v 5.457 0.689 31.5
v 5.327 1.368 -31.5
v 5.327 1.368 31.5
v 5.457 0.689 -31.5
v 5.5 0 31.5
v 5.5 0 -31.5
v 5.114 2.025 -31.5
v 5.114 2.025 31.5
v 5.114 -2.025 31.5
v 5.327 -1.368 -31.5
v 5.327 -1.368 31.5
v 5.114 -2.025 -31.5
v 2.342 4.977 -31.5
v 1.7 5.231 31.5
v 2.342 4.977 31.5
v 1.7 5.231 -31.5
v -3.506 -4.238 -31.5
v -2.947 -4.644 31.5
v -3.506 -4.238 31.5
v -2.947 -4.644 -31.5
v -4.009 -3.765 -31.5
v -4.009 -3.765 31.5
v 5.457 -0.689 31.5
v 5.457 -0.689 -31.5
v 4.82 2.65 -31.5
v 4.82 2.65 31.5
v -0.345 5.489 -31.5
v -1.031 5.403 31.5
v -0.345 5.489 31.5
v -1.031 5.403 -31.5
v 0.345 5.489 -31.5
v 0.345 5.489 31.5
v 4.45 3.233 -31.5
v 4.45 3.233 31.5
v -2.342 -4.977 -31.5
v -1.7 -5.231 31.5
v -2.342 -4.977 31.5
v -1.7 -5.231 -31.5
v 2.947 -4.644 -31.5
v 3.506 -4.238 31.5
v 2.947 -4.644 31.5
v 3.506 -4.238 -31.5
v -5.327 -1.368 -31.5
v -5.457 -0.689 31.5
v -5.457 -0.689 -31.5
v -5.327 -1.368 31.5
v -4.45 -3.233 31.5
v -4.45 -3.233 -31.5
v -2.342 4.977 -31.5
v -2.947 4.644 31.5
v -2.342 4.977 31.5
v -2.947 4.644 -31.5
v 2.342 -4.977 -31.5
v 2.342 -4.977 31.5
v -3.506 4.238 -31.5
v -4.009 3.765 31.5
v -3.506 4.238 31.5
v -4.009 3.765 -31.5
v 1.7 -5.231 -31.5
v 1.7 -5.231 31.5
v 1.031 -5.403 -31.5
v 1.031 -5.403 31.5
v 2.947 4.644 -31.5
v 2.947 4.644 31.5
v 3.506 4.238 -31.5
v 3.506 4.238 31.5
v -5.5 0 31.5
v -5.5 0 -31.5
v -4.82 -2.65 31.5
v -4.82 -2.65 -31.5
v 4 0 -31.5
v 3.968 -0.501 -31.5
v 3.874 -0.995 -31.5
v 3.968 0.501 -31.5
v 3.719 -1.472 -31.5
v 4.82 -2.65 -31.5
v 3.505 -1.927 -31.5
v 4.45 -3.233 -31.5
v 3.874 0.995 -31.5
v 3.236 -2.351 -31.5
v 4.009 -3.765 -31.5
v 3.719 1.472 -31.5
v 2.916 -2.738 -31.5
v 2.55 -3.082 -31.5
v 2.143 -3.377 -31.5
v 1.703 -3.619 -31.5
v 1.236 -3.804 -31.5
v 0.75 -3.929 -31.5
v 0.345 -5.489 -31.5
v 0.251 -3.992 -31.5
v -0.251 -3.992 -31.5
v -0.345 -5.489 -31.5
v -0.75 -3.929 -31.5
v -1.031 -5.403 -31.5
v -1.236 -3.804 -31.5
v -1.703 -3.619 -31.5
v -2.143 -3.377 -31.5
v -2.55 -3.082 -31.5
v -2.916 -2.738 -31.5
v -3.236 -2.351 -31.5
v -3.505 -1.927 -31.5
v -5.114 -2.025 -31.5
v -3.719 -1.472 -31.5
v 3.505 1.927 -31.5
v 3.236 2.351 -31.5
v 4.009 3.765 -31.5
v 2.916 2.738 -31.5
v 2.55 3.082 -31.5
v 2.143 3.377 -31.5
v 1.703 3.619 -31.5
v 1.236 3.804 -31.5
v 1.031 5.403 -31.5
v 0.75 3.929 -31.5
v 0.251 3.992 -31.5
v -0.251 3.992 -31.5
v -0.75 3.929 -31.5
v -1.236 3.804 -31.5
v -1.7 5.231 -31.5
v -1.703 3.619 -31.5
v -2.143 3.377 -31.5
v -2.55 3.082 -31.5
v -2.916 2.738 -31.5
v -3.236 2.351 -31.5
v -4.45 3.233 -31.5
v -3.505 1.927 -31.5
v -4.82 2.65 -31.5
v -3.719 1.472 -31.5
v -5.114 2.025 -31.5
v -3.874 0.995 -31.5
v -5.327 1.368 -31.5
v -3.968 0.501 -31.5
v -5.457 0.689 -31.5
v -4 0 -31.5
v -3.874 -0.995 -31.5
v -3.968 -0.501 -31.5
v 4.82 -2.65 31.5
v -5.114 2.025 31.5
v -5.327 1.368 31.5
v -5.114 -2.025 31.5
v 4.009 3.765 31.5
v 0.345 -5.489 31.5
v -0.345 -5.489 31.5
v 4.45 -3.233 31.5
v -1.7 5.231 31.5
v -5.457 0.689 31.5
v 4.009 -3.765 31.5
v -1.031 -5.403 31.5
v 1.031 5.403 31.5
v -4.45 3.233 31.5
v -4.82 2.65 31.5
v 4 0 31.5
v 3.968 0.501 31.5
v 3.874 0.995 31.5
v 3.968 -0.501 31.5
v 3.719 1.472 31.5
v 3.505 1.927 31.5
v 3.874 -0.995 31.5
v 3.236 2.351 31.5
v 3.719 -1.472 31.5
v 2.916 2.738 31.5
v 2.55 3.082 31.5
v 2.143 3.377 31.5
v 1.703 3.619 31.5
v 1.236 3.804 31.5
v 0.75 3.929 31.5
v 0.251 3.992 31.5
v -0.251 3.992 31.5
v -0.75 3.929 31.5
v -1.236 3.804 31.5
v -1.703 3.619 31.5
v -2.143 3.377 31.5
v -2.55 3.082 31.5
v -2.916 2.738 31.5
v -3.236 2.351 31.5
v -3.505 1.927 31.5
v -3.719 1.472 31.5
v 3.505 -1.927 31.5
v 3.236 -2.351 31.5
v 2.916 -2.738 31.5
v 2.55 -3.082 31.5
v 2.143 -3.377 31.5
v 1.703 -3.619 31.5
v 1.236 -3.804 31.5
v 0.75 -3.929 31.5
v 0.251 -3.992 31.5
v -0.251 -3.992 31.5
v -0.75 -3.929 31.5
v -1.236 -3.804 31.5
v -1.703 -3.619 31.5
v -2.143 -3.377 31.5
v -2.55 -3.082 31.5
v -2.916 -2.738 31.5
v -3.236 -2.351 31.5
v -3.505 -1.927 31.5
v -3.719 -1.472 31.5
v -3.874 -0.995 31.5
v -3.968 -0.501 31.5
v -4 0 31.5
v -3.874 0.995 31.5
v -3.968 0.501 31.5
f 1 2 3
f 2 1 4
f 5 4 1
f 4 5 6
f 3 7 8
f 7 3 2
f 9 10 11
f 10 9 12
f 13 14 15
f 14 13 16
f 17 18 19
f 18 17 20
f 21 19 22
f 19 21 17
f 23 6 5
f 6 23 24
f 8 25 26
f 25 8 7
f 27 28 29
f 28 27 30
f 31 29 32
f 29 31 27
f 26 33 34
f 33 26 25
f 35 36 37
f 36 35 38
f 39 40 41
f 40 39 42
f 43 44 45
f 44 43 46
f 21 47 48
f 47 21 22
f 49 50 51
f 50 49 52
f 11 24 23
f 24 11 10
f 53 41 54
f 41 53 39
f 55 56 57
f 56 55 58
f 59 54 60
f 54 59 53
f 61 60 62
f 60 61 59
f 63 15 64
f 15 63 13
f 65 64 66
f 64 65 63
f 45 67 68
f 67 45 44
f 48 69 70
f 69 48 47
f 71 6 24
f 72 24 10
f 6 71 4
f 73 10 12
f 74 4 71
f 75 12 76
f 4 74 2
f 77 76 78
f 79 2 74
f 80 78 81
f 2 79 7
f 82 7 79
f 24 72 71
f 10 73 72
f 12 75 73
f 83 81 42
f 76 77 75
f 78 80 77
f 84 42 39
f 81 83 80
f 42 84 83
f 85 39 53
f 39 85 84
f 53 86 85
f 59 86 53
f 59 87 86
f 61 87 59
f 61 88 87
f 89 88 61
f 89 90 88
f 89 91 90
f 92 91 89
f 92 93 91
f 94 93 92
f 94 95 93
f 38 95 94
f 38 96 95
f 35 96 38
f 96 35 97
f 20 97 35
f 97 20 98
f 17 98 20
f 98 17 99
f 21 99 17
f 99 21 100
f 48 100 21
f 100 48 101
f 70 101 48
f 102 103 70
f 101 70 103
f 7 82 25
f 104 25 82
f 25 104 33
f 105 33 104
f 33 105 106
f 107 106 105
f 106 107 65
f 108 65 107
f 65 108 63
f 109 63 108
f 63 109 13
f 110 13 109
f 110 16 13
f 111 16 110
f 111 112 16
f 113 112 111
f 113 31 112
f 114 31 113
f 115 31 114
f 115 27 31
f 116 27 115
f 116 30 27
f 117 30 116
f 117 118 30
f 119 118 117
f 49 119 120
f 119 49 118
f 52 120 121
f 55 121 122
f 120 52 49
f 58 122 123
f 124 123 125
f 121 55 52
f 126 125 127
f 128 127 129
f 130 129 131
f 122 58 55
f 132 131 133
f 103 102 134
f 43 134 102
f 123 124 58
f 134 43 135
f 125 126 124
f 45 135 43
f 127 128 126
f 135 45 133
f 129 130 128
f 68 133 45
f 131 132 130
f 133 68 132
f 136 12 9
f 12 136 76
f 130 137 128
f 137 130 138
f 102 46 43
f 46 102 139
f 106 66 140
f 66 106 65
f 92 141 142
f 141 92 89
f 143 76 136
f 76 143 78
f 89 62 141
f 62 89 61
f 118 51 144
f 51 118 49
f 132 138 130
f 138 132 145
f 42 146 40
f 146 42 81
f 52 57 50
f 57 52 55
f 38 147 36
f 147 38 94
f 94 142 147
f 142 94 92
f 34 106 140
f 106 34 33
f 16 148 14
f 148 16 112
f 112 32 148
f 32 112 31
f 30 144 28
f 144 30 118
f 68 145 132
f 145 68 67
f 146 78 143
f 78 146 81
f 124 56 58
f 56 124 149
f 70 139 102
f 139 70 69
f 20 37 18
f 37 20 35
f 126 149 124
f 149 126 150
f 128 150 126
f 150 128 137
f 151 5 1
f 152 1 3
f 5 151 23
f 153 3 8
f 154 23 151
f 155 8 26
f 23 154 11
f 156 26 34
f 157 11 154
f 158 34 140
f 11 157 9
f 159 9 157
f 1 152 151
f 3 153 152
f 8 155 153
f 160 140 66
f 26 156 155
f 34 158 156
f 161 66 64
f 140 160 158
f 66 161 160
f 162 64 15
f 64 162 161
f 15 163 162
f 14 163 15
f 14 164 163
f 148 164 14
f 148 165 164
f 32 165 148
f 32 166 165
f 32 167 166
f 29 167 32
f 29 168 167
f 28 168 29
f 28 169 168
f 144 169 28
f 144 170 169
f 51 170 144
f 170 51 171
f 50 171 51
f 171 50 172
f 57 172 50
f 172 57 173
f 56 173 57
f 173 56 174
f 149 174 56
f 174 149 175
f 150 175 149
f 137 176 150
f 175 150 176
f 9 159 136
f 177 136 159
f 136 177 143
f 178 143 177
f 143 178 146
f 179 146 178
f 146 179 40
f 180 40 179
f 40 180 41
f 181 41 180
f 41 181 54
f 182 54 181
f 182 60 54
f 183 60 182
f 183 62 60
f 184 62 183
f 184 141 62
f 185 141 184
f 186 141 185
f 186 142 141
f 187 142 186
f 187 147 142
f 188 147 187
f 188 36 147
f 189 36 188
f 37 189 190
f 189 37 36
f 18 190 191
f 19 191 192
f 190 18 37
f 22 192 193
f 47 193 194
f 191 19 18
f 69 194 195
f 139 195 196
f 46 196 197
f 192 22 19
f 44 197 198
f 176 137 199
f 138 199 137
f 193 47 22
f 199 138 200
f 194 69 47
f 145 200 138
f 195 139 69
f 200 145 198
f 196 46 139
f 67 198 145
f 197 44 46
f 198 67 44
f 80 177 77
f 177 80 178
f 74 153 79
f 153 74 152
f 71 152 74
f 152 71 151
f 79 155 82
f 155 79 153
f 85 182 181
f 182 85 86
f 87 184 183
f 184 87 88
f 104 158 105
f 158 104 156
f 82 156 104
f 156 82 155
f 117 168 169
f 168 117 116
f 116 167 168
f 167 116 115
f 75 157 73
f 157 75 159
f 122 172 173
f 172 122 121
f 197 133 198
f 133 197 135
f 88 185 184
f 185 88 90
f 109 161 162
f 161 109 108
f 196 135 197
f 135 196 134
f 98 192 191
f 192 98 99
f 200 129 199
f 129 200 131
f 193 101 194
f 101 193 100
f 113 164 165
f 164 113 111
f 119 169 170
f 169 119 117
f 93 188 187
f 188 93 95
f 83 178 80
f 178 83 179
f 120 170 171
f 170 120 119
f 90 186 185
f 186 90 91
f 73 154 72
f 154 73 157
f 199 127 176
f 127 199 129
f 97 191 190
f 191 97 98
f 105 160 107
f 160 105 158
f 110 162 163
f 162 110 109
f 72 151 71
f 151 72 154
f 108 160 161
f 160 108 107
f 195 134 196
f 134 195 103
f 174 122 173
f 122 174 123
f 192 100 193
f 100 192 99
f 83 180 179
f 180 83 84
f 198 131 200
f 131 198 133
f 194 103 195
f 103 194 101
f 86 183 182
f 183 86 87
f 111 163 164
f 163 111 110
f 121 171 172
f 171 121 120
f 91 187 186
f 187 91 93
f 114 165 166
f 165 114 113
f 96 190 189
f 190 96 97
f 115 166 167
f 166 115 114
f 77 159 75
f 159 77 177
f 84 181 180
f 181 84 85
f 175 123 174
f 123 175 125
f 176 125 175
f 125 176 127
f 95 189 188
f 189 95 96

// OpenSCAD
$fn = 50;


difference() {
	union() {
		translate(v = [0, 0, -31.5000000000]) {
			cylinder(h = 63, r = 5.5000000000);
		}
	}
	union() {
		translate(v = [0, 0, -100.0000000000]) {
			cylinder(h = 200, r = 4.0000000000);
		}
	}
}
